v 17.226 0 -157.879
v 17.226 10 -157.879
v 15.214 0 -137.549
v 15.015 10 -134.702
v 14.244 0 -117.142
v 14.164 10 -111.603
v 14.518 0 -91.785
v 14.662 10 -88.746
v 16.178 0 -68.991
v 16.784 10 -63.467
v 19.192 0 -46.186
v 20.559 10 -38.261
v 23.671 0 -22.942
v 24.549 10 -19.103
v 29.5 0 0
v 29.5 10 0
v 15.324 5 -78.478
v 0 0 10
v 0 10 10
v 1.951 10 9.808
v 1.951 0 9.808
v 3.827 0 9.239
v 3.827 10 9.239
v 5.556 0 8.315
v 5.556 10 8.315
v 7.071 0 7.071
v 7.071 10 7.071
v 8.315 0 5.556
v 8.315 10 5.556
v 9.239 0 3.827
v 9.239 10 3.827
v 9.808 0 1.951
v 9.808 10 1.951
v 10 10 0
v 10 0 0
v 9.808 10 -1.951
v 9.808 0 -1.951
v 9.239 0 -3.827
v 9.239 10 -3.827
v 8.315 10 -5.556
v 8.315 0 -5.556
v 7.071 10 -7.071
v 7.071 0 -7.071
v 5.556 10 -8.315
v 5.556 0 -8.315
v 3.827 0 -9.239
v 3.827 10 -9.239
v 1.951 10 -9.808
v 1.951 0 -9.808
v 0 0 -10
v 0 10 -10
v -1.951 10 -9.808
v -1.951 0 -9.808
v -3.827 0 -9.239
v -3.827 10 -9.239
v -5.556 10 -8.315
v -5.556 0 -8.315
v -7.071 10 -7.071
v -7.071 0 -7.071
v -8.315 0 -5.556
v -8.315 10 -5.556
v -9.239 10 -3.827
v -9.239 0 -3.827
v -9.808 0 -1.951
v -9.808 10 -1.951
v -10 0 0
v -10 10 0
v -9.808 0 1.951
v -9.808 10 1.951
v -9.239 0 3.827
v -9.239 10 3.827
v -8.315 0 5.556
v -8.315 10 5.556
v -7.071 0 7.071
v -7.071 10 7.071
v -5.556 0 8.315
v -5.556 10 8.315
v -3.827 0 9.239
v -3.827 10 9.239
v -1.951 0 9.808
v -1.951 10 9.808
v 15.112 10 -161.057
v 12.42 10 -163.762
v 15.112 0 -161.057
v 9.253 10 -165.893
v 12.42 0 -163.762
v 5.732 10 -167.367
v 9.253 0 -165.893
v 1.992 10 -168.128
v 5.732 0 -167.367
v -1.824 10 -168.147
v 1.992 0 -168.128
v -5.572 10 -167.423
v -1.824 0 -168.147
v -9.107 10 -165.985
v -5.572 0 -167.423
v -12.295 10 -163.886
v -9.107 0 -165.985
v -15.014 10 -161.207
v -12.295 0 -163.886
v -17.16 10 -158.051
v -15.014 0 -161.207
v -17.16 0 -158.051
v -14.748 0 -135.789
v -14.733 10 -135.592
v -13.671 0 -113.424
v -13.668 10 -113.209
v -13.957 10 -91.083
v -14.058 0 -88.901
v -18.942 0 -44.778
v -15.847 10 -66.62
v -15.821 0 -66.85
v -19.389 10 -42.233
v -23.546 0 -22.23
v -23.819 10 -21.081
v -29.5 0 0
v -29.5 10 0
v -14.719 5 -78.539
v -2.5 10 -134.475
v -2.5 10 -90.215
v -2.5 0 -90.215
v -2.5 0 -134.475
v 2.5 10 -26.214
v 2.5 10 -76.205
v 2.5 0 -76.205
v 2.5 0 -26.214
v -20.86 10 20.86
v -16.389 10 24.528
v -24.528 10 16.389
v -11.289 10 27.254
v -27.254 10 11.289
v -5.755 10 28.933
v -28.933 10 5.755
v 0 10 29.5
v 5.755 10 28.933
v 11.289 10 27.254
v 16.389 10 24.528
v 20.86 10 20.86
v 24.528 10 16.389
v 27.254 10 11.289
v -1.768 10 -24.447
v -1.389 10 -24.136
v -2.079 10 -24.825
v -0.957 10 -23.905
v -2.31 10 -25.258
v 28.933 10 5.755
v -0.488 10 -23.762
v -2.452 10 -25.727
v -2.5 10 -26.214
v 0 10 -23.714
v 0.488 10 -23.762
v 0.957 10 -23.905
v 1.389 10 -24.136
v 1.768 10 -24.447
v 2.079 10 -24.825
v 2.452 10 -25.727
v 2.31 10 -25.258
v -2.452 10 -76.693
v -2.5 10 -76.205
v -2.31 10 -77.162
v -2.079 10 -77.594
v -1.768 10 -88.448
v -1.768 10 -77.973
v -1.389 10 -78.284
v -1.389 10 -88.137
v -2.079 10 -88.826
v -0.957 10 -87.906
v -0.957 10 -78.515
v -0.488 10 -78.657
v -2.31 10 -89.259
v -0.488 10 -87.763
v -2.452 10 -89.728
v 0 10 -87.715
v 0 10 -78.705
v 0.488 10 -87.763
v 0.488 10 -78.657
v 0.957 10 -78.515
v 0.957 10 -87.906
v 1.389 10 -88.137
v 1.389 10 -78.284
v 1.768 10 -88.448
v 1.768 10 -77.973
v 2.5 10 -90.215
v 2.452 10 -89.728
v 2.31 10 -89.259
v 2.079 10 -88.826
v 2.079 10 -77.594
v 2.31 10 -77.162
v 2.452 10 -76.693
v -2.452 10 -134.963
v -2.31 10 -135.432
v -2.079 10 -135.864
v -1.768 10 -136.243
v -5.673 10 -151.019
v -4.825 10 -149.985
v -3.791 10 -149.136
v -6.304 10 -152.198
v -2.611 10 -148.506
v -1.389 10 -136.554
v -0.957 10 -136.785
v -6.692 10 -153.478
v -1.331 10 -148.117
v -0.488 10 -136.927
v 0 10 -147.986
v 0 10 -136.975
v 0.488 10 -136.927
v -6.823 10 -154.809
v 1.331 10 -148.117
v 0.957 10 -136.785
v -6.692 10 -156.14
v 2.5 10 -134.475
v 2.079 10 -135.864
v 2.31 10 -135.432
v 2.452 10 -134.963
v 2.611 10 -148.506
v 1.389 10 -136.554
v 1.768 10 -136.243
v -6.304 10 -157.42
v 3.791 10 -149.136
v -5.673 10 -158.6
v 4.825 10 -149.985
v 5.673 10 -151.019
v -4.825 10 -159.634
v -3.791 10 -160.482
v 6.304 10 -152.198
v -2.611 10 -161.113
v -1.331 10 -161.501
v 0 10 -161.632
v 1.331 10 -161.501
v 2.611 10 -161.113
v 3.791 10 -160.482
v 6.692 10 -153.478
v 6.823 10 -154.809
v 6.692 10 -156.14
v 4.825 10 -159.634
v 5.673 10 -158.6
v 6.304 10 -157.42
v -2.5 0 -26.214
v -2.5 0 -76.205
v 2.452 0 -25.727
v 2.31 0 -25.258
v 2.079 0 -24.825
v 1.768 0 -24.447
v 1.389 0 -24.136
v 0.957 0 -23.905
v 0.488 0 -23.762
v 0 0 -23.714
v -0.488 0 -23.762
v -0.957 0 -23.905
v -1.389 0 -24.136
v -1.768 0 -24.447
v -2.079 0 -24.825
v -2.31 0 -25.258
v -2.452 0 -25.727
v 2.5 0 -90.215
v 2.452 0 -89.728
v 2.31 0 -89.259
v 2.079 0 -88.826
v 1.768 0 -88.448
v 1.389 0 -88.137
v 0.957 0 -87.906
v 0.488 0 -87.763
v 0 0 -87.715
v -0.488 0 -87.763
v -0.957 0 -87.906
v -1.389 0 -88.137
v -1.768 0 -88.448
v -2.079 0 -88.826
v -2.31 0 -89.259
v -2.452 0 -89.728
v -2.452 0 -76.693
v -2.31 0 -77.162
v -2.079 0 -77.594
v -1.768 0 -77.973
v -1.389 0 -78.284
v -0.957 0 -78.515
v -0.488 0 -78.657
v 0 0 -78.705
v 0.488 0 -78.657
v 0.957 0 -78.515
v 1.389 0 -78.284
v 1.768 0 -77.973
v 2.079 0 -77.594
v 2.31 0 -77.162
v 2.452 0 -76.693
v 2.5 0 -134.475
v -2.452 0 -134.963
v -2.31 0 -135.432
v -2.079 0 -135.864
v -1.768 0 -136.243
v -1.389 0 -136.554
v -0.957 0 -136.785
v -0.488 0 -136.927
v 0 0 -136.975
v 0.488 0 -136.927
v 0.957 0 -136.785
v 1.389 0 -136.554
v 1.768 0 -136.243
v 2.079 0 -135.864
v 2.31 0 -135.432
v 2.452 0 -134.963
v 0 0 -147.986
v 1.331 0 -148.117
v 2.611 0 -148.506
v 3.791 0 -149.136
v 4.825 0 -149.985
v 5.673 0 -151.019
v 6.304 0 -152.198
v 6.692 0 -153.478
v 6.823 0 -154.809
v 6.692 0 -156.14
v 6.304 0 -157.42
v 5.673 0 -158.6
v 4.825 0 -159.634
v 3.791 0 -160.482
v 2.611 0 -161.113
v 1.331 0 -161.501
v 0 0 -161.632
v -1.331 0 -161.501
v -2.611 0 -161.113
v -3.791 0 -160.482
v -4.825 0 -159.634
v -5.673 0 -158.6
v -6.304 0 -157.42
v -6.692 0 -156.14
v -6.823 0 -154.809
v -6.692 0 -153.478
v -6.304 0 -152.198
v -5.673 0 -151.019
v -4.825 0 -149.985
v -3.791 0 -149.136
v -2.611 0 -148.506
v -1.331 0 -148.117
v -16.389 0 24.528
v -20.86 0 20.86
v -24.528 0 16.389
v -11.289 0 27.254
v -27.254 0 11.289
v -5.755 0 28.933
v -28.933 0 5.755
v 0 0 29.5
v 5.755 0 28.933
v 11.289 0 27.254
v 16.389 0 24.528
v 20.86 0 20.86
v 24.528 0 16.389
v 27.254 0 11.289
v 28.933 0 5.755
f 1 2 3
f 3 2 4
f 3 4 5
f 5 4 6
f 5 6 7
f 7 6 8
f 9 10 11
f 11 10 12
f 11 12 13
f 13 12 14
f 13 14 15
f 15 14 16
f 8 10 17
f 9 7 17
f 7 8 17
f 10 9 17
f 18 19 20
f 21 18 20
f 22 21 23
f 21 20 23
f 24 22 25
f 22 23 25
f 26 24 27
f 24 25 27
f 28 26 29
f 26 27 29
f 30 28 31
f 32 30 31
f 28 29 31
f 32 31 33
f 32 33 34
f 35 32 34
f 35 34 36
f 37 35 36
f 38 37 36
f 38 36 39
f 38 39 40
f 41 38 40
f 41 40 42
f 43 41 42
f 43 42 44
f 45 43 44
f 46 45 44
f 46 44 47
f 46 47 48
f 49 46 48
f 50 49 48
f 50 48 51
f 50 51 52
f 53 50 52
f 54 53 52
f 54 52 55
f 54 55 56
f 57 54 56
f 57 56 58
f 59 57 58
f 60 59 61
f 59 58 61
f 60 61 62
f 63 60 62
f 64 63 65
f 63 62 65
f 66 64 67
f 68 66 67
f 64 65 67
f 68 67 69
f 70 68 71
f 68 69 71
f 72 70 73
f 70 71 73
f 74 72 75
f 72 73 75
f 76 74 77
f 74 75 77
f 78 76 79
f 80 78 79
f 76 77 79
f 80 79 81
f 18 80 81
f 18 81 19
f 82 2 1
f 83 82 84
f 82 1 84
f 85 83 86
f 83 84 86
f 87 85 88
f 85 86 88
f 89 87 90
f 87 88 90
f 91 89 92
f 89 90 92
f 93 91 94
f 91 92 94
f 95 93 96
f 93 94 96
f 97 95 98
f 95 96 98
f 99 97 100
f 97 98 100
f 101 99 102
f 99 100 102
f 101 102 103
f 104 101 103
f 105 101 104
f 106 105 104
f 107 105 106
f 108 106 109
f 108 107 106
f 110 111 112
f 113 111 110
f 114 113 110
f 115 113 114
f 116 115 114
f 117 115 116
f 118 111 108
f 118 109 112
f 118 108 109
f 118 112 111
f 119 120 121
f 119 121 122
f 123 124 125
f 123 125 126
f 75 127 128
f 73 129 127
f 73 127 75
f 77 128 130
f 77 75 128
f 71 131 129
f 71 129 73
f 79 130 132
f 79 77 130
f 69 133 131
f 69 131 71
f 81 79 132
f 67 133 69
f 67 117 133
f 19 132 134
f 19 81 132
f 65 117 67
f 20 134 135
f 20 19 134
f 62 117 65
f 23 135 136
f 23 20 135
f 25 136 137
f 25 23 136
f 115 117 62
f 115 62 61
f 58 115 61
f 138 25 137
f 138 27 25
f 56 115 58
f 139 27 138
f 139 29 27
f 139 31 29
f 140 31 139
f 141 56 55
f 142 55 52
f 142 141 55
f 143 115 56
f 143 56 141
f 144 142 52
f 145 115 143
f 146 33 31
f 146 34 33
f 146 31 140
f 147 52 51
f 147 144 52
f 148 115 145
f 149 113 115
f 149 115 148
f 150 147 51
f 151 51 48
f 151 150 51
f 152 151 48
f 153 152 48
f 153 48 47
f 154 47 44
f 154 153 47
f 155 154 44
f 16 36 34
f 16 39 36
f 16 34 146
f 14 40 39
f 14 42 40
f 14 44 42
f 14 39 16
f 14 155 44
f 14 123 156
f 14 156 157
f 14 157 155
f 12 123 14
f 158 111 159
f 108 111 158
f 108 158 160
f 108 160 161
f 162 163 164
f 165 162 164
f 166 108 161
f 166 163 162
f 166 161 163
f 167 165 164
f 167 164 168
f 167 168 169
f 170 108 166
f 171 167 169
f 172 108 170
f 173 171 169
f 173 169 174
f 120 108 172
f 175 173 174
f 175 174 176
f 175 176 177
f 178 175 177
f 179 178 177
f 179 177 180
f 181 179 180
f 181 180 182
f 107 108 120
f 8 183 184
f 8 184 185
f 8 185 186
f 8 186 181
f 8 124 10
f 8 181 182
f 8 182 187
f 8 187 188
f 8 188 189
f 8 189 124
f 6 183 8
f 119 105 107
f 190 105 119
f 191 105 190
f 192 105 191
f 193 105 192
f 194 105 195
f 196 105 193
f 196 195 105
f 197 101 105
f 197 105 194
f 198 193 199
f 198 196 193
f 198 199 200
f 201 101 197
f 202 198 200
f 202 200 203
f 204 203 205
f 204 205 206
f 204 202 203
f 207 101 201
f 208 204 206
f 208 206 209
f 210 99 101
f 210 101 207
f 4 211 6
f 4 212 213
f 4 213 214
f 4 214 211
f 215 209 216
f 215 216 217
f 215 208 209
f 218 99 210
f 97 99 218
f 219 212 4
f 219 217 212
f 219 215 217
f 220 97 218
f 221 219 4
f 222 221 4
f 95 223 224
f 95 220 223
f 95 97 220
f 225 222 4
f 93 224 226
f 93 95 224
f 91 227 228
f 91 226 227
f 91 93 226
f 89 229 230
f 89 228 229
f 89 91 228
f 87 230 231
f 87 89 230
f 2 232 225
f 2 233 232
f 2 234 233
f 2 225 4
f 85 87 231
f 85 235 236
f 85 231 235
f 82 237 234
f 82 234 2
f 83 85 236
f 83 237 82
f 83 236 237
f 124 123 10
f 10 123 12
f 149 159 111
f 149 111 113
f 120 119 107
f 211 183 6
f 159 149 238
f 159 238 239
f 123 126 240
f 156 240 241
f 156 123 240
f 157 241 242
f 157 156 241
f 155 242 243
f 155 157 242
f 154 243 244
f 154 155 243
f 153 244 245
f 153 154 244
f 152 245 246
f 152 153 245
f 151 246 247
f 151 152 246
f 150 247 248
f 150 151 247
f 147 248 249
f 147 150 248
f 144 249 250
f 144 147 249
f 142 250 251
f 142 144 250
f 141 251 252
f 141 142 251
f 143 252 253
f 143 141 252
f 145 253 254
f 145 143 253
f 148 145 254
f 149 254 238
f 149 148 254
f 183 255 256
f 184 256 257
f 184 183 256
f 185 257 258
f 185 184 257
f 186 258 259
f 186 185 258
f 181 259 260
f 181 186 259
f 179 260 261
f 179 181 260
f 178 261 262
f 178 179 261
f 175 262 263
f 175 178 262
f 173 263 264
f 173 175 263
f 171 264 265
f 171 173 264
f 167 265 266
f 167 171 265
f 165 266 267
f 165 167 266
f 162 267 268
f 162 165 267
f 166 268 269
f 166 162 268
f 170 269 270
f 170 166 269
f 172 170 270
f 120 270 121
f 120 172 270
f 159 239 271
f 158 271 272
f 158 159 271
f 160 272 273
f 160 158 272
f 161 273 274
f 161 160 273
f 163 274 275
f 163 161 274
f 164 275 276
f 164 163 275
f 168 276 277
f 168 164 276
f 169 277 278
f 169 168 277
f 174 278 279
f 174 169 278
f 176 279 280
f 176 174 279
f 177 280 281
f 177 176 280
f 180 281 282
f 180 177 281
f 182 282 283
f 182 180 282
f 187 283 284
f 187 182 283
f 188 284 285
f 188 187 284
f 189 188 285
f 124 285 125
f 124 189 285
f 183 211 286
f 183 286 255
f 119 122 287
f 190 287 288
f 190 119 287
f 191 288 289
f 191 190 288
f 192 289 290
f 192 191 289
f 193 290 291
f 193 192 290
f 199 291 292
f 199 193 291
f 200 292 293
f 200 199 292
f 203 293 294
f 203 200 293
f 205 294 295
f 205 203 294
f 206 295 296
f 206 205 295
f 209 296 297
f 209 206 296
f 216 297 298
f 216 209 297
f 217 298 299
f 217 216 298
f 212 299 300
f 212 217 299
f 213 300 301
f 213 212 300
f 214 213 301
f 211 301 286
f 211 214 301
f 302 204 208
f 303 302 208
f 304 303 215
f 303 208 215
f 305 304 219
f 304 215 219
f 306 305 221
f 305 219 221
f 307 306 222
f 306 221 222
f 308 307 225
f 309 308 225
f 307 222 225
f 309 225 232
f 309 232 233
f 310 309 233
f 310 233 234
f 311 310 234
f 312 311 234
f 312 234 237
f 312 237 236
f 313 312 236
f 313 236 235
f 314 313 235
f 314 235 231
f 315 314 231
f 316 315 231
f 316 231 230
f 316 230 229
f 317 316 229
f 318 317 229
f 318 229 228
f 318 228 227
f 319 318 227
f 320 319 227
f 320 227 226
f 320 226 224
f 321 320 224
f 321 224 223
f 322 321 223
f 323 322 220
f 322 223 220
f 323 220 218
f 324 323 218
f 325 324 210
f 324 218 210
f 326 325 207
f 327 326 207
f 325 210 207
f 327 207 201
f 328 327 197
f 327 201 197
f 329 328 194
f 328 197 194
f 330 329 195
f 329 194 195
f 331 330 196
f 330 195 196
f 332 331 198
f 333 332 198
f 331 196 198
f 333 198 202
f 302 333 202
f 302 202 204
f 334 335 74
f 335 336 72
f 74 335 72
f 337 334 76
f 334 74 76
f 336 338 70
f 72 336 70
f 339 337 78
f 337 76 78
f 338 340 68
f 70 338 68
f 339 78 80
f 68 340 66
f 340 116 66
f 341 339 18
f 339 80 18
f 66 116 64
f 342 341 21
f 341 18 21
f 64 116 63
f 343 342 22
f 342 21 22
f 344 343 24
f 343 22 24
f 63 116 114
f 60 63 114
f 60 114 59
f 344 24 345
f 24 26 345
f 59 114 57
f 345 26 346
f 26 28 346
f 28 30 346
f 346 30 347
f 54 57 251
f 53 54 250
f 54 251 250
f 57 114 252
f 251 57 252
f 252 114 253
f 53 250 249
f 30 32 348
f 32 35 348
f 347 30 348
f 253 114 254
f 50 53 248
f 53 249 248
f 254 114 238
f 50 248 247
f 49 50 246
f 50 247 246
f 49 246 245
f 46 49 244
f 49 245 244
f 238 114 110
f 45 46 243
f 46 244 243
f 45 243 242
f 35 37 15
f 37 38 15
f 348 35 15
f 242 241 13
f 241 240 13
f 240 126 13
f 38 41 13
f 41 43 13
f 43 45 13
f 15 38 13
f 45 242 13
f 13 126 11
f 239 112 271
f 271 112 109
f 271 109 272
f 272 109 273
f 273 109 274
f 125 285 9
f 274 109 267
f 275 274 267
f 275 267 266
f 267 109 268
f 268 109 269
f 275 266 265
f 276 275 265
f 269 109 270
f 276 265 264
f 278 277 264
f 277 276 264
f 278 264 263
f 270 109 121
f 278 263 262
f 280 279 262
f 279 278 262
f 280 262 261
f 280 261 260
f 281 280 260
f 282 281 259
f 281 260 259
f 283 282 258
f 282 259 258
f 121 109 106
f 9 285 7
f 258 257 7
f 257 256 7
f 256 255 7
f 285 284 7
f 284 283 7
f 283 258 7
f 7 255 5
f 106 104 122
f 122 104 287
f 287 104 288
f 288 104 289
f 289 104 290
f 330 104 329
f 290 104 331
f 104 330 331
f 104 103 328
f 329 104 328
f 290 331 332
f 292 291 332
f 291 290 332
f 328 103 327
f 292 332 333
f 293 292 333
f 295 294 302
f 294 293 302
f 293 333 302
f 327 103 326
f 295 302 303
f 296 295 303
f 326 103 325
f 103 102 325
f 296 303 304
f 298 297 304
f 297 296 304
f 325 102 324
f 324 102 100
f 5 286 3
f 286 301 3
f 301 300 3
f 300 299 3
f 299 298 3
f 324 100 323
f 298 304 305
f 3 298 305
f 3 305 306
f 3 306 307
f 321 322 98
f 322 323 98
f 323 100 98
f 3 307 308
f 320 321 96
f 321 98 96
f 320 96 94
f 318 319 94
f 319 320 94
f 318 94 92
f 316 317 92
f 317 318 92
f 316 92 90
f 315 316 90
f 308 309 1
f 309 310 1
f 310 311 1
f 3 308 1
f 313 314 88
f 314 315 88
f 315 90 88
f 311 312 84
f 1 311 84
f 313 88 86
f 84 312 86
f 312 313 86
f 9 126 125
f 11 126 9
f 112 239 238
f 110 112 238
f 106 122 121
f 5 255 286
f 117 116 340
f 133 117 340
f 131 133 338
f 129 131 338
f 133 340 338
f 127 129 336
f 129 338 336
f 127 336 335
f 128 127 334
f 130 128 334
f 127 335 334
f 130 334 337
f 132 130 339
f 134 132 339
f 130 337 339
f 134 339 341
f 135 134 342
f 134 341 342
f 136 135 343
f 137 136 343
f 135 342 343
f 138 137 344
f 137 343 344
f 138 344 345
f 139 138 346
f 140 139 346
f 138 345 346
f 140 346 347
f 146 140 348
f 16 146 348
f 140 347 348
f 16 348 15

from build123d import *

# Parameters (mm, degrees)
EXTRUDE_1_DEPTH     = 10
CUT_EXTRUDE_1_DEPTH = 172.090332978
CUT_EXTRUDE_2_DEPTH = 172.0903331
SKETCH_4_R          = 6.822924711
CUT_EXTRUDE_3_DEPTH = 172.0903331
SKETCH_5_R          = 10
CUT_EXTRUDE_4_DEPTH = 172.0903331


with BuildPart() as part:
    # 草图1 → 凸台-拉伸1 (new body)
    with BuildSketch(Plane(origin=(0, 0, 0), x_dir=(1, 0, 0), z_dir=(0, 1, 0))):
        with BuildLine():
            Line((-19.5, 150), (-29.5, 0))
            ThreePointArc((-29.5, 0), (0, -29.5), (29.5, 0))
            Line((29.5, 0), (19.47339908, 150.003410942))
            ThreePointArc((19.47339908, 150.003410942), (-0.014895879, 168.230948441), (-19.5, 150))
        make_face()
    extrude(amount=EXTRUDE_1_DEPTH)

    # 草图2 → 切除-拉伸1 (cut, through all)
    with BuildSketch(Plane(origin=(0, 10, 0), x_dir=(1, 0, 0), z_dir=(0, 1, 0))):
        with BuildLine():
            Line((-18.406498031, 166.402529529), (-29.5, 0))
            add(Edge.make_bspline(
                [(-18.406498031, 166.402529529), (-4.887642604, 82.123380262), (-29.5, 0)],
                knots=[0, 0, 0, 1, 1, 1], degree=2))
        make_face()
        with BuildLine():
            Line((18.377392911, 166.400260194), (29.5, 0))
            add(Edge.make_bspline(
                [(18.377392911, 166.400260194), (6.100316571, 82.176287971), (29.5, 0)],
                knots=[0, 0, 0, 1, 1, 1], degree=2))
        make_face()
    extrude(amount=-CUT_EXTRUDE_1_DEPTH, mode=Mode.SUBTRACT)

    # 草图3 → 切除-拉伸2 (cut, through all)
    with BuildSketch(Plane(origin=(0, 10, 0), x_dir=(1, 0, 0), z_dir=(0, 1, 0))):
        with BuildLine():
            Line((-2.5, 90.215422083), (-2.5, 134.474861862))
            ThreePointArc((-2.5, 134.474861862), (0, 136.974861862), (2.5, 134.474861862))
            Line((2.5, 134.474861862), (2.5, 90.215422083))
            ThreePointArc((2.5, 90.215422083), (0, 87.715422083), (-2.5, 90.215422083))
        make_face()
        with BuildLine():
            Line((2.5, 76.205239707), (2.5, 26.214361684))
            ThreePointArc((2.5, 26.214361684), (0, 23.714361684), (-2.5, 26.214361684))
            Line((-2.5, 26.214361684), (-2.5, 76.205239707))
            ThreePointArc((-2.5, 76.205239707), (0, 78.705239707), (2.5, 76.205239707))
        make_face()
    extrude(amount=-CUT_EXTRUDE_2_DEPTH, mode=Mode.SUBTRACT)

    # 草图4 → 切除-拉伸3 (cut, through all)
    with BuildSketch(Plane(origin=(0, 10, 0), x_dir=(1, 0, 0), z_dir=(0, 1, 0))):
        with Locations(Location((0, 154.809118853, 0), (0, 0, 270))):
            Circle(SKETCH_4_R)
    extrude(amount=-CUT_EXTRUDE_3_DEPTH, mode=Mode.SUBTRACT)

    # 草图5 → 切除-拉伸4 (cut, through all)
    with BuildSketch(Plane(origin=(0, 10, 0), x_dir=(1, 0, 0), z_dir=(0, 1, 0))):
        with Locations(Location((0, 0, 0), (0, 0, 270))):
            Circle(SKETCH_5_R)
    extrude(amount=-CUT_EXTRUDE_4_DEPTH, mode=Mode.SUBTRACT)


solid = part.part
